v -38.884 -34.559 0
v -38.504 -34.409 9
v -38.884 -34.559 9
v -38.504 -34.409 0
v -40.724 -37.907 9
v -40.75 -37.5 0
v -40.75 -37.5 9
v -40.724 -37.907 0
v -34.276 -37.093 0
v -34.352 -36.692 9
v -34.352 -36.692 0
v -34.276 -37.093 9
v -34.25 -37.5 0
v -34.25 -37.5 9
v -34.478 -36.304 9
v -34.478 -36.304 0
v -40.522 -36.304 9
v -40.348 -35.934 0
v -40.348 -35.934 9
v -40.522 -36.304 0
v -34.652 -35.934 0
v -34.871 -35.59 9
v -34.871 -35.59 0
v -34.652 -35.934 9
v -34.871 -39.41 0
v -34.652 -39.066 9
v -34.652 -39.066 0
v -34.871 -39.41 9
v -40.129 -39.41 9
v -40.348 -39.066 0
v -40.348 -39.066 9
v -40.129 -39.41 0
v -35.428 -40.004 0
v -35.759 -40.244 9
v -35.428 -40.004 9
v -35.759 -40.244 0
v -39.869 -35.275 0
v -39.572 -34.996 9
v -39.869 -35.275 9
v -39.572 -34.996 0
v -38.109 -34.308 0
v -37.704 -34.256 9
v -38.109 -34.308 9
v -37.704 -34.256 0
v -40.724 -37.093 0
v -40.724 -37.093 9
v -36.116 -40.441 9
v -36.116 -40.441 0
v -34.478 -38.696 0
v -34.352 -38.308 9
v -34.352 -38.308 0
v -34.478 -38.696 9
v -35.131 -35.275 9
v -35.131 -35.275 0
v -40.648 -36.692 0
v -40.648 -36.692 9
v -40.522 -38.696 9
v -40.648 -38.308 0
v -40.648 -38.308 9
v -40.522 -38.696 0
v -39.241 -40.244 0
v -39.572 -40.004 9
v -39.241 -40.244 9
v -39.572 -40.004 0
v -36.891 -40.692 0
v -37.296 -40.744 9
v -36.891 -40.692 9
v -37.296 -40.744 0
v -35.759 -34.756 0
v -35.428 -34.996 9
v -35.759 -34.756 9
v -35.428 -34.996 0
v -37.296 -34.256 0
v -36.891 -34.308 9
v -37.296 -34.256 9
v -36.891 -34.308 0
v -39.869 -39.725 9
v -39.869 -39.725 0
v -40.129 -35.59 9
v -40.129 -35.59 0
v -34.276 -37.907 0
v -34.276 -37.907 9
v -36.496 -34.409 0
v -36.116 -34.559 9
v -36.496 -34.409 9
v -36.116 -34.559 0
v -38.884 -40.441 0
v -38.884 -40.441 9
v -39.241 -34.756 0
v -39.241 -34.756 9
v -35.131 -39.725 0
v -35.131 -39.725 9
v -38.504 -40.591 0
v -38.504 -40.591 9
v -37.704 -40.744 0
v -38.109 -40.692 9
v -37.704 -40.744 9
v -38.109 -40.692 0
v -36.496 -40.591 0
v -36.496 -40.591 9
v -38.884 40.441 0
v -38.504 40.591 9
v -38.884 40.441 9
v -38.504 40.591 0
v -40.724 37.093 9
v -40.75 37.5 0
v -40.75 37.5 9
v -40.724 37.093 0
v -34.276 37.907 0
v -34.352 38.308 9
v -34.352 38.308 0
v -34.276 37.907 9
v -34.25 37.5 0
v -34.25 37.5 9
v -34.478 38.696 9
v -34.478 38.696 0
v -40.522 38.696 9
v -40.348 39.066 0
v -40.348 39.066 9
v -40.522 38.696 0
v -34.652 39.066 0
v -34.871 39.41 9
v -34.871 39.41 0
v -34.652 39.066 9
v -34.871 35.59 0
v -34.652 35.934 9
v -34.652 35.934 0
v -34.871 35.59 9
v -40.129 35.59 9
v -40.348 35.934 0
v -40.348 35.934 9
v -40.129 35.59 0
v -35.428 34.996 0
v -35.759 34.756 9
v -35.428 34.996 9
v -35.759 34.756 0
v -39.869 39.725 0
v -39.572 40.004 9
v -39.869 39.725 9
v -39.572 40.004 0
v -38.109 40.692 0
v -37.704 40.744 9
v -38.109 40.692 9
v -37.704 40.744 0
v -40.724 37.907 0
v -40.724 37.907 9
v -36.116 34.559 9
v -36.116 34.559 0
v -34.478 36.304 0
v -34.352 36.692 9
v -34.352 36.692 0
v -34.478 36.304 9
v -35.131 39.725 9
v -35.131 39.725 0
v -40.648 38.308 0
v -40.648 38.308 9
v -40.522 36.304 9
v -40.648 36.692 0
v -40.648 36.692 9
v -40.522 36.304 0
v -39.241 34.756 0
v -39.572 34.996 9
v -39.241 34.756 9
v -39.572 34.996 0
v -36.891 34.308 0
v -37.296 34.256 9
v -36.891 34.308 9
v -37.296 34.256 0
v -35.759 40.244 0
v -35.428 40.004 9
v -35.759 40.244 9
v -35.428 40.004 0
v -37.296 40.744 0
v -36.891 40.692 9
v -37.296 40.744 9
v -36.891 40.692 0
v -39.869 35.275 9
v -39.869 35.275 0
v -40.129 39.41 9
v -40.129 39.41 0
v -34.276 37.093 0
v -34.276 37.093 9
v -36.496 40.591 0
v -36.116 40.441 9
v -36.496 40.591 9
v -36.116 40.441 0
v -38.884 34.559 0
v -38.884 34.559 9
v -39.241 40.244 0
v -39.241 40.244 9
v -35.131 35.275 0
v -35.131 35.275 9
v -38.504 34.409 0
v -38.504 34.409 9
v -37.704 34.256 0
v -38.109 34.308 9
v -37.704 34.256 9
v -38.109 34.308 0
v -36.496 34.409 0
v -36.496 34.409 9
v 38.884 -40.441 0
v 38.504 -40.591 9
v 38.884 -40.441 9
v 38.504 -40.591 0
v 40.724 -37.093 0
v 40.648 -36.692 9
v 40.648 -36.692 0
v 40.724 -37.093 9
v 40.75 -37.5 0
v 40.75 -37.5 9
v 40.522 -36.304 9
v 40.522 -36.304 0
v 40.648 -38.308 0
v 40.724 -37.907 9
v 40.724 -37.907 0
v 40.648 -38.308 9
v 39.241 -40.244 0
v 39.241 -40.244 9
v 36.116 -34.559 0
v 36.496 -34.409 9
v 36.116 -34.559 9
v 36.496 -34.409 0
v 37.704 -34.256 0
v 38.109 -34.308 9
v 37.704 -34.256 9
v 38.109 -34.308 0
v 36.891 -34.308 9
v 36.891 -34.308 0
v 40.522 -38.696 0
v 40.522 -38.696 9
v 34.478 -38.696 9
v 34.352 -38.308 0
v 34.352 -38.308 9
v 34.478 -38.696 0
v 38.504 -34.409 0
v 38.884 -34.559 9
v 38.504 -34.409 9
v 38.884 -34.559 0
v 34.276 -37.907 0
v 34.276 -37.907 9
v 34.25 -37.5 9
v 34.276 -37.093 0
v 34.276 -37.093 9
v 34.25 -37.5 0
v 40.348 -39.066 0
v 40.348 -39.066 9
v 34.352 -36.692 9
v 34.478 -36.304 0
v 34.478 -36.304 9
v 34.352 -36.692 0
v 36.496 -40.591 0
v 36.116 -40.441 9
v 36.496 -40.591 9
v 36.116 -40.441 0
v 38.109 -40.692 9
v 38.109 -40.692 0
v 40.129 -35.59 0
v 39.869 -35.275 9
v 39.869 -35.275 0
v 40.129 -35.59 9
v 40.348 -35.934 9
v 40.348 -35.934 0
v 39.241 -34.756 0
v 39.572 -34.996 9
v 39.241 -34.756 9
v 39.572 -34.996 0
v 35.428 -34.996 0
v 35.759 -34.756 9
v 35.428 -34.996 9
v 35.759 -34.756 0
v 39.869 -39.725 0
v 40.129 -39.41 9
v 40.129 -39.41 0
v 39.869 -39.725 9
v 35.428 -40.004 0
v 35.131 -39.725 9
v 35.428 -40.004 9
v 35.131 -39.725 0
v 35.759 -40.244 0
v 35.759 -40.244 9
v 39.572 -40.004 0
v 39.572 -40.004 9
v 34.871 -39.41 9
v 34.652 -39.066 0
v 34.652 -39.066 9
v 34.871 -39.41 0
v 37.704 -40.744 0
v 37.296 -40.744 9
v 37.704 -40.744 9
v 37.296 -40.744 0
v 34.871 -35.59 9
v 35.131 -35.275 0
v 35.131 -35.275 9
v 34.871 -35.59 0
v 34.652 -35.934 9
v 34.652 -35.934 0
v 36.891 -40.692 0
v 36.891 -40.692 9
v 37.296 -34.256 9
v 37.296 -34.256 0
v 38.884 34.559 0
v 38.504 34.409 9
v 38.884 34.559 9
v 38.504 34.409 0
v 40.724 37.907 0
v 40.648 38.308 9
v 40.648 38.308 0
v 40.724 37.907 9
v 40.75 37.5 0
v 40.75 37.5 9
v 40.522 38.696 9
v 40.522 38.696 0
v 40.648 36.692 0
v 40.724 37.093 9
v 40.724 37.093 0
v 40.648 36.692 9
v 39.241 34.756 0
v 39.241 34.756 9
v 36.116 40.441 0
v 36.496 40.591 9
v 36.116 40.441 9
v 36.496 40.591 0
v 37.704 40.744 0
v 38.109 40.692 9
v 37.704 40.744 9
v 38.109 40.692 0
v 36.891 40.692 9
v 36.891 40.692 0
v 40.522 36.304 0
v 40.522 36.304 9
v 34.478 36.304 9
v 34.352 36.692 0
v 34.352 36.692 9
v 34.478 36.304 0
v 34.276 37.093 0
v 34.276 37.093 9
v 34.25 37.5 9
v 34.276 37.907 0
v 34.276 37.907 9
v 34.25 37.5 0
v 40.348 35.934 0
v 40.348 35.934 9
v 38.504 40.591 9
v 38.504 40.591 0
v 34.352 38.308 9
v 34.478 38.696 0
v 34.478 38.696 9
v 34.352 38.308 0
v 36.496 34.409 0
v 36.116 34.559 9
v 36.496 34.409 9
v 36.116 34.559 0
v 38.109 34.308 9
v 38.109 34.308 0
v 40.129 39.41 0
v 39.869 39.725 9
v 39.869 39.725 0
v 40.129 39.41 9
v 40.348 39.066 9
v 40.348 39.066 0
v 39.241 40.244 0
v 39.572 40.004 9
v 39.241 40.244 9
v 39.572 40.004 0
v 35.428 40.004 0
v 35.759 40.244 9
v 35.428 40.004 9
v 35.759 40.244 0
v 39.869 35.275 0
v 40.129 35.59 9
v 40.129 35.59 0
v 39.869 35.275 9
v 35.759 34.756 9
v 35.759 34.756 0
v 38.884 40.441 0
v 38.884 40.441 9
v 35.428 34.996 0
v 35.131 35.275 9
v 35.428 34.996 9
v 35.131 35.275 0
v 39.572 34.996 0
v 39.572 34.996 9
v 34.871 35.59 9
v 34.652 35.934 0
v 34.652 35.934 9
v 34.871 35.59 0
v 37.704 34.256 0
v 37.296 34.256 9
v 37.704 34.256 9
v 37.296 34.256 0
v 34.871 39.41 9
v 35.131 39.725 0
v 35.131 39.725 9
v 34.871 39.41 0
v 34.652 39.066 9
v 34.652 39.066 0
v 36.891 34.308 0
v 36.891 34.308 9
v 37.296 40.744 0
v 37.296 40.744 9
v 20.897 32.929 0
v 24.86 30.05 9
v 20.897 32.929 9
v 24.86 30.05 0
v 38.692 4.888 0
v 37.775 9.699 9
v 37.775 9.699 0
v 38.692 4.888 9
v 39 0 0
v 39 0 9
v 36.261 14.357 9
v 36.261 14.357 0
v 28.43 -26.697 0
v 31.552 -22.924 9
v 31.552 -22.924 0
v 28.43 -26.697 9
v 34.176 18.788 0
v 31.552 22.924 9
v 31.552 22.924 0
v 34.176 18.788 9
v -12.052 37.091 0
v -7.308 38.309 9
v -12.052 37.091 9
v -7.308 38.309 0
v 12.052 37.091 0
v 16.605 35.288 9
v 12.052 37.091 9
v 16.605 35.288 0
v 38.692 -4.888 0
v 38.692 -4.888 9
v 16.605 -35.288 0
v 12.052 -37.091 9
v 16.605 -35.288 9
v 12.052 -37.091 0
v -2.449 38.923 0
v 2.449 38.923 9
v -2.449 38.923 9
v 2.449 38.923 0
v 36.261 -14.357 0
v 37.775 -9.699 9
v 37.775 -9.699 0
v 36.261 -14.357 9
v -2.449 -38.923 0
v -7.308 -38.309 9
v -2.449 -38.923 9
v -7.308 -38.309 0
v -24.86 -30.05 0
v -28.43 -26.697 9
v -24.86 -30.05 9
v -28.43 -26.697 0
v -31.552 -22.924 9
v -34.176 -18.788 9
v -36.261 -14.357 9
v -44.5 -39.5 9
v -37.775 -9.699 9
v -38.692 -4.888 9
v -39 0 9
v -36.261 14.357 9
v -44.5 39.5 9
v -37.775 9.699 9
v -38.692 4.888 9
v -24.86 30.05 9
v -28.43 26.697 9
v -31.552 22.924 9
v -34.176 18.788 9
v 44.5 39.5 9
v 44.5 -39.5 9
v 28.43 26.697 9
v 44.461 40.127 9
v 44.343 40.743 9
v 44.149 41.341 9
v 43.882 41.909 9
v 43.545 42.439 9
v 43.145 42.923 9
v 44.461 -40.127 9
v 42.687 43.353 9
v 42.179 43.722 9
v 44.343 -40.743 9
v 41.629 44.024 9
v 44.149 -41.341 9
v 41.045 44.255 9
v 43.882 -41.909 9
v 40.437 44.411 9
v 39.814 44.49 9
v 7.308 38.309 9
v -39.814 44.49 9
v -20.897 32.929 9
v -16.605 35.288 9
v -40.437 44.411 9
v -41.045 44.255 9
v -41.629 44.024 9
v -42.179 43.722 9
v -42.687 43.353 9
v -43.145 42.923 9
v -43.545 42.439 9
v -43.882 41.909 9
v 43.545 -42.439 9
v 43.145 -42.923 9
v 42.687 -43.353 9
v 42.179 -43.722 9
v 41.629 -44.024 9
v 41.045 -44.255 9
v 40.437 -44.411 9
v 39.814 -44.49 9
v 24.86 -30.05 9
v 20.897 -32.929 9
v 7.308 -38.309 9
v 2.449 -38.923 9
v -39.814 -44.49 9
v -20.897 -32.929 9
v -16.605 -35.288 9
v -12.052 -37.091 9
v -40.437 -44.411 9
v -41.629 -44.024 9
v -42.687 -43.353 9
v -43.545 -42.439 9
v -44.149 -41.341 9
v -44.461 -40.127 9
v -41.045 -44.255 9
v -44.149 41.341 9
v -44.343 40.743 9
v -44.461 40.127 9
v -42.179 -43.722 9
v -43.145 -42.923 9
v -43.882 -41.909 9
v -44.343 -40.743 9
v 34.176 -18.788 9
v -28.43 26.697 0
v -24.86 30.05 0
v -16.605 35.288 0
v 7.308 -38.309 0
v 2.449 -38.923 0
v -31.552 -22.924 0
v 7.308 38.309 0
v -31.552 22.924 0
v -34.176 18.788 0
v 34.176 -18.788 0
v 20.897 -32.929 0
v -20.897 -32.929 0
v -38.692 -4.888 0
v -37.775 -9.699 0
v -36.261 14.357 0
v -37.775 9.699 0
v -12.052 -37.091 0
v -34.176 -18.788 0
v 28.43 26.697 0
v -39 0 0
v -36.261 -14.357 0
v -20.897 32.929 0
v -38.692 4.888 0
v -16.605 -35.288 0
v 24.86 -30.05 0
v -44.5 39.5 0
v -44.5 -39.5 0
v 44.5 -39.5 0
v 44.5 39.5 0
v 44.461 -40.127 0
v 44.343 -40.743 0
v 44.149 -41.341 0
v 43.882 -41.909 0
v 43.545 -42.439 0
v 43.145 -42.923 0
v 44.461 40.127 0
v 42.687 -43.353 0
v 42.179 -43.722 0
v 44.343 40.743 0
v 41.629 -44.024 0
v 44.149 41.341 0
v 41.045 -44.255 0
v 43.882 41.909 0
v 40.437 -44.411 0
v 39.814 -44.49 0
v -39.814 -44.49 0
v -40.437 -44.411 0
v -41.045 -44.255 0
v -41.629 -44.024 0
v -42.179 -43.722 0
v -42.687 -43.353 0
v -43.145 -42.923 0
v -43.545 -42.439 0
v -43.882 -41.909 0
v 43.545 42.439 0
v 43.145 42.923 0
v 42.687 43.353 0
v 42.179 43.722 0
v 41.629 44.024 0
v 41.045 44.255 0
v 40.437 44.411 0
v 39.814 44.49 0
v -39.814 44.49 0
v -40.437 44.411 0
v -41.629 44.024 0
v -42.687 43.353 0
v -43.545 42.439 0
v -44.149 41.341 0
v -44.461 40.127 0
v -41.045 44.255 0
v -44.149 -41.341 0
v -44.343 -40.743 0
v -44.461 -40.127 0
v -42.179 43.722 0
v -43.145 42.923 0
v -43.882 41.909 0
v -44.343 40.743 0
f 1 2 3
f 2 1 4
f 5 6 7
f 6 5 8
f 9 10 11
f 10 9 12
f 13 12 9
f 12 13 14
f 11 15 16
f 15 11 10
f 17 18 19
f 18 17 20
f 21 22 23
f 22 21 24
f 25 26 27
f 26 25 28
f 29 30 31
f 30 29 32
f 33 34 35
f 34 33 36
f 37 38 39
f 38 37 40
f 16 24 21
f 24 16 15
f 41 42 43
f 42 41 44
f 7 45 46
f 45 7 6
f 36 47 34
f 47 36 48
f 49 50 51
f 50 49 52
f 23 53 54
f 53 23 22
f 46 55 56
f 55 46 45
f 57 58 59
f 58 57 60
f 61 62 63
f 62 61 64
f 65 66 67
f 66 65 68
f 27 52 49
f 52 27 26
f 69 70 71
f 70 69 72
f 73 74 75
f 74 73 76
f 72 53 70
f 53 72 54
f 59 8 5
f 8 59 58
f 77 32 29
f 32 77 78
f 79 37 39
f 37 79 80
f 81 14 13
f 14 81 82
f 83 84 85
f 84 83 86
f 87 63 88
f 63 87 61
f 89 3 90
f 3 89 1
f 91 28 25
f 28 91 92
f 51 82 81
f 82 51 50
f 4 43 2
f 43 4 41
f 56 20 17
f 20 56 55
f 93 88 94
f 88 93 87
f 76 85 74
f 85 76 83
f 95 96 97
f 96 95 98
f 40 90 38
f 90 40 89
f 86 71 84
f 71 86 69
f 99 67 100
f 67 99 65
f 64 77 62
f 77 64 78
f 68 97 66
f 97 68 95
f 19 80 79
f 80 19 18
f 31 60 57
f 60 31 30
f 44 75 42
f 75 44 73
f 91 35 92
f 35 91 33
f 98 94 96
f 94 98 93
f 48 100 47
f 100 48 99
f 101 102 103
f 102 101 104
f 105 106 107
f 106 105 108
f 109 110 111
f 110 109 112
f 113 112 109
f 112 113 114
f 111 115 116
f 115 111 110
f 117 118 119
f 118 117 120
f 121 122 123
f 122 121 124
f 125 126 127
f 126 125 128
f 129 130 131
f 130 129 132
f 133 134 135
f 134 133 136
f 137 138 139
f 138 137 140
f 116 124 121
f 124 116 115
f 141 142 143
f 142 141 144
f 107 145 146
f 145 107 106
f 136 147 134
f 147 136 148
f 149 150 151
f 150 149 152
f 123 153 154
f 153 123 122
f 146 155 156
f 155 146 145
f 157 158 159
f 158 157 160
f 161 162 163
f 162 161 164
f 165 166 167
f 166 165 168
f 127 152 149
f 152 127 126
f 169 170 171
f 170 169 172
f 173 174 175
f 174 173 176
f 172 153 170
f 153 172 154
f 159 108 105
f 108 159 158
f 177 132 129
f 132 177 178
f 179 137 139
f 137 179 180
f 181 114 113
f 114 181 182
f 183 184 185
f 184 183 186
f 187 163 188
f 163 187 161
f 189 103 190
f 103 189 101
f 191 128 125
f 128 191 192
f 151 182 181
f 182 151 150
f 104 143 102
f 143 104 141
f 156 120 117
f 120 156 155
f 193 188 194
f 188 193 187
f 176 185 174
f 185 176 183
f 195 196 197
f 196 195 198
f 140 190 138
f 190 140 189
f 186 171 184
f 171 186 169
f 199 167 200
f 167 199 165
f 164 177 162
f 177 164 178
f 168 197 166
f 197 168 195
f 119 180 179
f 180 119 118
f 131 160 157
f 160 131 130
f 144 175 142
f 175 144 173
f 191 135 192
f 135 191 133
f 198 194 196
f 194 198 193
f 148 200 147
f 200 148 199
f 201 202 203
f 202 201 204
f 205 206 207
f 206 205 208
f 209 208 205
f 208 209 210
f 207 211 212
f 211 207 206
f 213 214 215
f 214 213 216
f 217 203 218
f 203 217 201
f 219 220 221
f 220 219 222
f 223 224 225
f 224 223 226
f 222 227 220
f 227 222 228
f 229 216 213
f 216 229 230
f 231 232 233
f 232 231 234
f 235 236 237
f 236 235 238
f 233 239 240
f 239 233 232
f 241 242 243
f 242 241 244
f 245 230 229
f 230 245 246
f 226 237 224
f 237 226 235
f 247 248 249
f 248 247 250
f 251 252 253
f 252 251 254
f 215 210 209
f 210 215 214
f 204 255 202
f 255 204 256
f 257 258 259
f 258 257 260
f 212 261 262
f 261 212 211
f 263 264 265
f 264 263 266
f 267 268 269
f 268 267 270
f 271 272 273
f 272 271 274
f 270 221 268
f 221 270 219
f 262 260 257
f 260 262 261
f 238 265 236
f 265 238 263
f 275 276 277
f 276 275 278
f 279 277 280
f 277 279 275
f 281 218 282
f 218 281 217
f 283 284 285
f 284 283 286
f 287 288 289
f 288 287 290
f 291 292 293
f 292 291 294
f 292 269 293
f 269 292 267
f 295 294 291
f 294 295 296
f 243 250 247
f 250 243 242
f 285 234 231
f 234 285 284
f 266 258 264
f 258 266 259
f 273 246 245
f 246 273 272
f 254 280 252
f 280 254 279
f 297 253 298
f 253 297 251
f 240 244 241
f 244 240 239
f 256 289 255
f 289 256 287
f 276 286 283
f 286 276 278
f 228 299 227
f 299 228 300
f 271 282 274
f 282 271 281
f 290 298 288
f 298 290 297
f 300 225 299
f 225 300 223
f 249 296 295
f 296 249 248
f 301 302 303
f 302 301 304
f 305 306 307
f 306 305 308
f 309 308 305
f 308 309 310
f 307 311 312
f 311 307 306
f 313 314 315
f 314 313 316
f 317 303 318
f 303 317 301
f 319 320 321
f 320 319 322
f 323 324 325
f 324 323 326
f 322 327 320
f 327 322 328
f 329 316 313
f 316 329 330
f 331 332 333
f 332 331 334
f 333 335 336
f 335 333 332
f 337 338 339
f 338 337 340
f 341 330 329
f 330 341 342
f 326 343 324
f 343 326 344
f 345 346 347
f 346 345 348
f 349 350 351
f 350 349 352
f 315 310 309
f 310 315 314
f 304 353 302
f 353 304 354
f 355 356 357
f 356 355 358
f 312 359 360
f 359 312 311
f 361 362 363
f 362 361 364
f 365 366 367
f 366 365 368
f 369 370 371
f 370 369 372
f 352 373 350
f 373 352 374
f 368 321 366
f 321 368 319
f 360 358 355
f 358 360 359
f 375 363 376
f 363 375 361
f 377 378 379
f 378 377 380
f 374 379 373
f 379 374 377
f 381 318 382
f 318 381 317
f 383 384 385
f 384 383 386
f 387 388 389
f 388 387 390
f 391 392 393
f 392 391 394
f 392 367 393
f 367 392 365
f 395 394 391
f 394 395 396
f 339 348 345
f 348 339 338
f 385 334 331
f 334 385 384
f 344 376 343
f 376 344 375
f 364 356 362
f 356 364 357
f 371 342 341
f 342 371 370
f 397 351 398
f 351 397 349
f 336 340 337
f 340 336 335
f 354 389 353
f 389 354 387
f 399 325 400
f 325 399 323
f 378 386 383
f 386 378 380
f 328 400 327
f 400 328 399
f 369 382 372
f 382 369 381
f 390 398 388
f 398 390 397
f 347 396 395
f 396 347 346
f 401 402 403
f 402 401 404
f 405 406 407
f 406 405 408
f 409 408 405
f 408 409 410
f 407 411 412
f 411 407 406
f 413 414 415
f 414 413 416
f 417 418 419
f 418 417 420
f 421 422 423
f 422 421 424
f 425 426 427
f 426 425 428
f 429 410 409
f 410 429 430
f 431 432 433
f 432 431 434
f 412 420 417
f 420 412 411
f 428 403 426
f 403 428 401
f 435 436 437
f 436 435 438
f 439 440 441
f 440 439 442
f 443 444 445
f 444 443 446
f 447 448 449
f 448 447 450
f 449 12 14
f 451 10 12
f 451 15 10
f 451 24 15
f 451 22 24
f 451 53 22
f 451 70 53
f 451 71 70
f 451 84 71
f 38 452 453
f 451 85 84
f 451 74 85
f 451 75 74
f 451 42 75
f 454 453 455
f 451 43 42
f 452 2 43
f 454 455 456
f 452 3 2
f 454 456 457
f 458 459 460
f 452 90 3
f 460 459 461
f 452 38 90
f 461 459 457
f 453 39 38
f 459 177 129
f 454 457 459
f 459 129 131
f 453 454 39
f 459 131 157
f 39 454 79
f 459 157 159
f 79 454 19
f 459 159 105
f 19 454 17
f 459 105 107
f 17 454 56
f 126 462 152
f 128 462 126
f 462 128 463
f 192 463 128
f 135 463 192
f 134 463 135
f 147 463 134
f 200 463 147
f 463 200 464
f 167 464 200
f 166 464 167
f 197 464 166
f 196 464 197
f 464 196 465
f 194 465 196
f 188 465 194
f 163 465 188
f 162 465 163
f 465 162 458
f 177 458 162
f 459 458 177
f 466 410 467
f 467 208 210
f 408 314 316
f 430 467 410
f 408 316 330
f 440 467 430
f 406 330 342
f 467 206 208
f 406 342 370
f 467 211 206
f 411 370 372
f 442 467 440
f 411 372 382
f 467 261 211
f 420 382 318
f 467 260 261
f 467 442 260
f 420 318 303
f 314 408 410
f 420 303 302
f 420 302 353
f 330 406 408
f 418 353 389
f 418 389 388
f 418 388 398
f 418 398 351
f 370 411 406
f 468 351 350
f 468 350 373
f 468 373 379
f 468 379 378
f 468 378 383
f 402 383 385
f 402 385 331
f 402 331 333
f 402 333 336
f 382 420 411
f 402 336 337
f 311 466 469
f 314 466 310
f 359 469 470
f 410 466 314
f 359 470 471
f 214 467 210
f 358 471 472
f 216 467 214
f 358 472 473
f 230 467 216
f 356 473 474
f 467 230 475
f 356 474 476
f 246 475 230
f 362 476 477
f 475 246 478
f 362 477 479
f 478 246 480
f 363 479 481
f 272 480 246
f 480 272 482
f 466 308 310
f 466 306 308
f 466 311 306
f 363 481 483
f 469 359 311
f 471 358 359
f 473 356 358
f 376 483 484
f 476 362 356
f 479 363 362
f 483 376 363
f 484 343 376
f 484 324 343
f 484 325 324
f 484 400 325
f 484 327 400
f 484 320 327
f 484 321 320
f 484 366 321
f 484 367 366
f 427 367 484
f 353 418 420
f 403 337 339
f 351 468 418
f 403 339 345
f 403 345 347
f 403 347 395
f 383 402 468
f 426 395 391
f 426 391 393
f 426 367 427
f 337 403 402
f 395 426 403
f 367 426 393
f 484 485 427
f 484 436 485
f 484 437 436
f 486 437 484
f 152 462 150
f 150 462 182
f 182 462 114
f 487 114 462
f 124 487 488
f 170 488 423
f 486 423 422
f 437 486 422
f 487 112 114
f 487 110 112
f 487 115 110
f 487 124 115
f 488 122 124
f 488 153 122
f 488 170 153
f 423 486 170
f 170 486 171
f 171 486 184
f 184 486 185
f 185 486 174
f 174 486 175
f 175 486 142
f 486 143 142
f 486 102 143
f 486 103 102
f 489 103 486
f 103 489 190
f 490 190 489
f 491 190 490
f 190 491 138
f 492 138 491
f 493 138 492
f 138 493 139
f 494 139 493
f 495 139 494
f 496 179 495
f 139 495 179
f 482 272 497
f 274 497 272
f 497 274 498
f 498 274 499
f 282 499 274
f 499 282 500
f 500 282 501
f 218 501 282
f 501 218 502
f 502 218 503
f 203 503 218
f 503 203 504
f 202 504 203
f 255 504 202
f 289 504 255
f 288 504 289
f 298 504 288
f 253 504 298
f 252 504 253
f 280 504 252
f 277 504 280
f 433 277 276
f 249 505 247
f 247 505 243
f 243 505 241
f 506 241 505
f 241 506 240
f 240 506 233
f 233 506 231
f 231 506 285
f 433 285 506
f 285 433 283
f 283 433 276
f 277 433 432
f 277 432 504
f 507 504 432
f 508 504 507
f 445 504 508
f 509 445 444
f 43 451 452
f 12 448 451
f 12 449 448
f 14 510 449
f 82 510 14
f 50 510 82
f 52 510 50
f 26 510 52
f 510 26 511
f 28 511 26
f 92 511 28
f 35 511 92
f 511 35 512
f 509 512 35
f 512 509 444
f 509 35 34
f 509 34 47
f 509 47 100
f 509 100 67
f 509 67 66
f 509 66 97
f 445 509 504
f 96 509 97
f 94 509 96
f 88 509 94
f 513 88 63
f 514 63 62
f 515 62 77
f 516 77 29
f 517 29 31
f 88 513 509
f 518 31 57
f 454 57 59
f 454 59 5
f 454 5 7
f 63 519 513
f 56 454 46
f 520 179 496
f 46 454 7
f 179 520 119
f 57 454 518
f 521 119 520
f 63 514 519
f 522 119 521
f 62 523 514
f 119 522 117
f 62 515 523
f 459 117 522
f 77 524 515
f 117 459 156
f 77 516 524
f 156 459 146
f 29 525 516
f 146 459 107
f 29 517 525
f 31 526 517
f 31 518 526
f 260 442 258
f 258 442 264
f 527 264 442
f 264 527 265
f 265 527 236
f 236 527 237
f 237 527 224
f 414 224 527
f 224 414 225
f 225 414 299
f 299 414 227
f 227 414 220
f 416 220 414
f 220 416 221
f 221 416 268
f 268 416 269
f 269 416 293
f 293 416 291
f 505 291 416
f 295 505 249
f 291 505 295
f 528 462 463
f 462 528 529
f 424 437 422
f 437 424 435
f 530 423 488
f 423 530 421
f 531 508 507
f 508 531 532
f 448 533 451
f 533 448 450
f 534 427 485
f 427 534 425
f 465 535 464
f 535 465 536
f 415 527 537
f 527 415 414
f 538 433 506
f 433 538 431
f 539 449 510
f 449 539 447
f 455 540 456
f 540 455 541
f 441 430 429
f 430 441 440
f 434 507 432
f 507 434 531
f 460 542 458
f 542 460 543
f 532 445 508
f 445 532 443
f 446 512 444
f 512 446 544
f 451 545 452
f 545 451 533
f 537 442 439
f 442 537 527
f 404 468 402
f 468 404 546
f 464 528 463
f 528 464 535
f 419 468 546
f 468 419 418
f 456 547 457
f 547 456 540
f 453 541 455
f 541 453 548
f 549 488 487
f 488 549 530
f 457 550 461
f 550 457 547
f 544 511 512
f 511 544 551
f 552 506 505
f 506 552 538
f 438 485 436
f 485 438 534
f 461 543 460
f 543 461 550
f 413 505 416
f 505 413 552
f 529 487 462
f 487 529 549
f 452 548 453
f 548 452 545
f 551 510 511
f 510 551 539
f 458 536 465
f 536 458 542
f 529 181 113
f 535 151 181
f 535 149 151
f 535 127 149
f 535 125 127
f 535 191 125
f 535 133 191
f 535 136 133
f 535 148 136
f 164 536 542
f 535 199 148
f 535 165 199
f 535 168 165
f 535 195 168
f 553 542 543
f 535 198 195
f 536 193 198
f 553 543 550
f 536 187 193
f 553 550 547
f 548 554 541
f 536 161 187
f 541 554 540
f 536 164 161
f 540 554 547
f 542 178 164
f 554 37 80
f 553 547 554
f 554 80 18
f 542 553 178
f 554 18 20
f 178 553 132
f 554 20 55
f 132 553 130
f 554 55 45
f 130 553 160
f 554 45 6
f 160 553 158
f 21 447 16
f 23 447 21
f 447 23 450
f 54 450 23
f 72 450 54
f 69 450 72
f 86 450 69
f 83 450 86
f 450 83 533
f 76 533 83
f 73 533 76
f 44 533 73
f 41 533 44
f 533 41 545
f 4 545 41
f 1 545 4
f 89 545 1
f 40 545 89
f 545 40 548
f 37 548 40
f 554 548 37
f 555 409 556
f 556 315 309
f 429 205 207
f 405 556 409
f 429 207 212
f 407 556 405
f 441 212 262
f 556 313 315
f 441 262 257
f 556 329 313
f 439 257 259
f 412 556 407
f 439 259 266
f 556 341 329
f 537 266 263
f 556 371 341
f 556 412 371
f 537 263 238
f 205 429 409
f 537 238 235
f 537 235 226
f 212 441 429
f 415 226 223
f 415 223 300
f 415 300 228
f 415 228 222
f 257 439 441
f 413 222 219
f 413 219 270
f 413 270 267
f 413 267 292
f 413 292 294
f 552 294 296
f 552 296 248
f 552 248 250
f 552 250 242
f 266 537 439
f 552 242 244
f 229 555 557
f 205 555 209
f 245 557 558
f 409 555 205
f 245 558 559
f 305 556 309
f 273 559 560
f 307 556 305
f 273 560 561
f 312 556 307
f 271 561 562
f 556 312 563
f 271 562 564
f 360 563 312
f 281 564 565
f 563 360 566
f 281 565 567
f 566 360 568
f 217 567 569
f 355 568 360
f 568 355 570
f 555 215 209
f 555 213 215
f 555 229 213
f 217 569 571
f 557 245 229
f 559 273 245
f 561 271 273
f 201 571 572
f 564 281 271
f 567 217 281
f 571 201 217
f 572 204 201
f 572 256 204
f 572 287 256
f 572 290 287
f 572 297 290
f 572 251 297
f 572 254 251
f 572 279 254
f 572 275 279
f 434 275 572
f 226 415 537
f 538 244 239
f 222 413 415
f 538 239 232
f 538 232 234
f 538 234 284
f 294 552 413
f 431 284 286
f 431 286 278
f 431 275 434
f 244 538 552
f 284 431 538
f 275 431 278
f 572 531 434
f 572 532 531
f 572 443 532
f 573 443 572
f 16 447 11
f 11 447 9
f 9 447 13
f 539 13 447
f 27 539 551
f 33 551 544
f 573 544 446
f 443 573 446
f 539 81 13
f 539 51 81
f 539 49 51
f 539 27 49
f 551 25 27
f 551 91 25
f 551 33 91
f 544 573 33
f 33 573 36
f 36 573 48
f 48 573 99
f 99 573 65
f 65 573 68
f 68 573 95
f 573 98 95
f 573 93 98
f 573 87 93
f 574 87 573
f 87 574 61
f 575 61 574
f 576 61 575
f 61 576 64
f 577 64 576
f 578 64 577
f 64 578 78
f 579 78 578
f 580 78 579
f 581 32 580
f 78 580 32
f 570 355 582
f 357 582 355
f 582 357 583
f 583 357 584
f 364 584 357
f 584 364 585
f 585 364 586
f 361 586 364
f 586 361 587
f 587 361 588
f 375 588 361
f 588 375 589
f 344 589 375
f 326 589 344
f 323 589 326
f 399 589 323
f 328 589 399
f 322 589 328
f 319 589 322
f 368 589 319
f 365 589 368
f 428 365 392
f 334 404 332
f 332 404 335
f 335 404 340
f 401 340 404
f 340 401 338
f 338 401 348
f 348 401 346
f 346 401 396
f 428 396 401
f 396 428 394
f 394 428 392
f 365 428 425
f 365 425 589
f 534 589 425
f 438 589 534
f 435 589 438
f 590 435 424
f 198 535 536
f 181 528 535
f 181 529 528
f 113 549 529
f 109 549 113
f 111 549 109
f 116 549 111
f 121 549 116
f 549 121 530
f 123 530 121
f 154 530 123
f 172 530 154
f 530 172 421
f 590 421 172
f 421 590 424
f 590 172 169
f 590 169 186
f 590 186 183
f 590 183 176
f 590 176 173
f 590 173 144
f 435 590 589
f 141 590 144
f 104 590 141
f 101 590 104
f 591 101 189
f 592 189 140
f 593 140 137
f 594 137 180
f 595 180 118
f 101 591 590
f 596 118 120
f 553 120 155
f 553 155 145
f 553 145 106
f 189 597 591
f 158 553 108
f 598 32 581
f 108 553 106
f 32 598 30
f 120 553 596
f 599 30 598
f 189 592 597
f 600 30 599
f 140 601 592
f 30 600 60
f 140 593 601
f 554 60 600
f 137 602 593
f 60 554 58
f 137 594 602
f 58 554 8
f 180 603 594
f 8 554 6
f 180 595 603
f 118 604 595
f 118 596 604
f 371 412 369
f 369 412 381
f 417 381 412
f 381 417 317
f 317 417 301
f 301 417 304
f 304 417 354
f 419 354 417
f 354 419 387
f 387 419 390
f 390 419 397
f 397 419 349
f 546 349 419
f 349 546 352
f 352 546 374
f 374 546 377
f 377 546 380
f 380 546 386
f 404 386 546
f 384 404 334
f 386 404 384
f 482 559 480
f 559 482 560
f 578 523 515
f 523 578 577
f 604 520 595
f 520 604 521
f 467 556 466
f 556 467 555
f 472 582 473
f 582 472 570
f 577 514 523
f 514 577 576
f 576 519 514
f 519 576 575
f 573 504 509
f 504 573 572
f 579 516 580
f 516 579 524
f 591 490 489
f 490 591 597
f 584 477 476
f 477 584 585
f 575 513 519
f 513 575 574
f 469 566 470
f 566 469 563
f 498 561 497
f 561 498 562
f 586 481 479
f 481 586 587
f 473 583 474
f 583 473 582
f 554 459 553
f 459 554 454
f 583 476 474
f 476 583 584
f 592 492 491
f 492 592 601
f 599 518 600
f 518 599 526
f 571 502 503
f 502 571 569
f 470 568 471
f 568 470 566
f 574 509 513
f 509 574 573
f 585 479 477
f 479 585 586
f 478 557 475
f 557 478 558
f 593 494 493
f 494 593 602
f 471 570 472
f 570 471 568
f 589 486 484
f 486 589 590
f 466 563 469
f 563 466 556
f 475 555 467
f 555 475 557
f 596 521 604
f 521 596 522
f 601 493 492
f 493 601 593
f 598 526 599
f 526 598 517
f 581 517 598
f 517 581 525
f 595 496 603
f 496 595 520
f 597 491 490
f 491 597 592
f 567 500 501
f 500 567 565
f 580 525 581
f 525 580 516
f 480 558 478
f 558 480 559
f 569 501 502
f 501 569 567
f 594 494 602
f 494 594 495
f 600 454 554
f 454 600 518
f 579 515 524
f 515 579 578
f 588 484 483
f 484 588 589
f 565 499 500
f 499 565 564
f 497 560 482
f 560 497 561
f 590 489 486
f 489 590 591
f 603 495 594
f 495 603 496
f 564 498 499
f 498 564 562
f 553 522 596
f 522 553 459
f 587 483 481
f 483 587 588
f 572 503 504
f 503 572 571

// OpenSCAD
$fn = 50;


difference() {
	union() {
		hull() {
			translate(v = [-39.5000000000, 39.5000000000, 0]) {
				cylinder(h = 9, r = 5);
			}
			translate(v = [39.5000000000, 39.5000000000, 0]) {
				cylinder(h = 9, r = 5);
			}
			translate(v = [-39.5000000000, -39.5000000000, 0]) {
				cylinder(h = 9, r = 5);
			}
			translate(v = [39.5000000000, -39.5000000000, 0]) {
				cylinder(h = 9, r = 5);
			}
		}
	}
	union() {
		#translate(v = [-37.5000000000, -37.5000000000, -100.0000000000]) {
			cylinder(h = 200, r = 3.2500000000);
		}
		#translate(v = [-37.5000000000, 37.5000000000, -100.0000000000]) {
			cylinder(h = 200, r = 3.2500000000);
		}
		#translate(v = [37.5000000000, -37.5000000000, -100.0000000000]) {
			cylinder(h = 200, r = 3.2500000000);
		}
		#translate(v = [37.5000000000, 37.5000000000, -100.0000000000]) {
			cylinder(h = 200, r = 3.2500000000);
		}
		#cylinder(h = 9, r = 39.0000000000);
	}
}
